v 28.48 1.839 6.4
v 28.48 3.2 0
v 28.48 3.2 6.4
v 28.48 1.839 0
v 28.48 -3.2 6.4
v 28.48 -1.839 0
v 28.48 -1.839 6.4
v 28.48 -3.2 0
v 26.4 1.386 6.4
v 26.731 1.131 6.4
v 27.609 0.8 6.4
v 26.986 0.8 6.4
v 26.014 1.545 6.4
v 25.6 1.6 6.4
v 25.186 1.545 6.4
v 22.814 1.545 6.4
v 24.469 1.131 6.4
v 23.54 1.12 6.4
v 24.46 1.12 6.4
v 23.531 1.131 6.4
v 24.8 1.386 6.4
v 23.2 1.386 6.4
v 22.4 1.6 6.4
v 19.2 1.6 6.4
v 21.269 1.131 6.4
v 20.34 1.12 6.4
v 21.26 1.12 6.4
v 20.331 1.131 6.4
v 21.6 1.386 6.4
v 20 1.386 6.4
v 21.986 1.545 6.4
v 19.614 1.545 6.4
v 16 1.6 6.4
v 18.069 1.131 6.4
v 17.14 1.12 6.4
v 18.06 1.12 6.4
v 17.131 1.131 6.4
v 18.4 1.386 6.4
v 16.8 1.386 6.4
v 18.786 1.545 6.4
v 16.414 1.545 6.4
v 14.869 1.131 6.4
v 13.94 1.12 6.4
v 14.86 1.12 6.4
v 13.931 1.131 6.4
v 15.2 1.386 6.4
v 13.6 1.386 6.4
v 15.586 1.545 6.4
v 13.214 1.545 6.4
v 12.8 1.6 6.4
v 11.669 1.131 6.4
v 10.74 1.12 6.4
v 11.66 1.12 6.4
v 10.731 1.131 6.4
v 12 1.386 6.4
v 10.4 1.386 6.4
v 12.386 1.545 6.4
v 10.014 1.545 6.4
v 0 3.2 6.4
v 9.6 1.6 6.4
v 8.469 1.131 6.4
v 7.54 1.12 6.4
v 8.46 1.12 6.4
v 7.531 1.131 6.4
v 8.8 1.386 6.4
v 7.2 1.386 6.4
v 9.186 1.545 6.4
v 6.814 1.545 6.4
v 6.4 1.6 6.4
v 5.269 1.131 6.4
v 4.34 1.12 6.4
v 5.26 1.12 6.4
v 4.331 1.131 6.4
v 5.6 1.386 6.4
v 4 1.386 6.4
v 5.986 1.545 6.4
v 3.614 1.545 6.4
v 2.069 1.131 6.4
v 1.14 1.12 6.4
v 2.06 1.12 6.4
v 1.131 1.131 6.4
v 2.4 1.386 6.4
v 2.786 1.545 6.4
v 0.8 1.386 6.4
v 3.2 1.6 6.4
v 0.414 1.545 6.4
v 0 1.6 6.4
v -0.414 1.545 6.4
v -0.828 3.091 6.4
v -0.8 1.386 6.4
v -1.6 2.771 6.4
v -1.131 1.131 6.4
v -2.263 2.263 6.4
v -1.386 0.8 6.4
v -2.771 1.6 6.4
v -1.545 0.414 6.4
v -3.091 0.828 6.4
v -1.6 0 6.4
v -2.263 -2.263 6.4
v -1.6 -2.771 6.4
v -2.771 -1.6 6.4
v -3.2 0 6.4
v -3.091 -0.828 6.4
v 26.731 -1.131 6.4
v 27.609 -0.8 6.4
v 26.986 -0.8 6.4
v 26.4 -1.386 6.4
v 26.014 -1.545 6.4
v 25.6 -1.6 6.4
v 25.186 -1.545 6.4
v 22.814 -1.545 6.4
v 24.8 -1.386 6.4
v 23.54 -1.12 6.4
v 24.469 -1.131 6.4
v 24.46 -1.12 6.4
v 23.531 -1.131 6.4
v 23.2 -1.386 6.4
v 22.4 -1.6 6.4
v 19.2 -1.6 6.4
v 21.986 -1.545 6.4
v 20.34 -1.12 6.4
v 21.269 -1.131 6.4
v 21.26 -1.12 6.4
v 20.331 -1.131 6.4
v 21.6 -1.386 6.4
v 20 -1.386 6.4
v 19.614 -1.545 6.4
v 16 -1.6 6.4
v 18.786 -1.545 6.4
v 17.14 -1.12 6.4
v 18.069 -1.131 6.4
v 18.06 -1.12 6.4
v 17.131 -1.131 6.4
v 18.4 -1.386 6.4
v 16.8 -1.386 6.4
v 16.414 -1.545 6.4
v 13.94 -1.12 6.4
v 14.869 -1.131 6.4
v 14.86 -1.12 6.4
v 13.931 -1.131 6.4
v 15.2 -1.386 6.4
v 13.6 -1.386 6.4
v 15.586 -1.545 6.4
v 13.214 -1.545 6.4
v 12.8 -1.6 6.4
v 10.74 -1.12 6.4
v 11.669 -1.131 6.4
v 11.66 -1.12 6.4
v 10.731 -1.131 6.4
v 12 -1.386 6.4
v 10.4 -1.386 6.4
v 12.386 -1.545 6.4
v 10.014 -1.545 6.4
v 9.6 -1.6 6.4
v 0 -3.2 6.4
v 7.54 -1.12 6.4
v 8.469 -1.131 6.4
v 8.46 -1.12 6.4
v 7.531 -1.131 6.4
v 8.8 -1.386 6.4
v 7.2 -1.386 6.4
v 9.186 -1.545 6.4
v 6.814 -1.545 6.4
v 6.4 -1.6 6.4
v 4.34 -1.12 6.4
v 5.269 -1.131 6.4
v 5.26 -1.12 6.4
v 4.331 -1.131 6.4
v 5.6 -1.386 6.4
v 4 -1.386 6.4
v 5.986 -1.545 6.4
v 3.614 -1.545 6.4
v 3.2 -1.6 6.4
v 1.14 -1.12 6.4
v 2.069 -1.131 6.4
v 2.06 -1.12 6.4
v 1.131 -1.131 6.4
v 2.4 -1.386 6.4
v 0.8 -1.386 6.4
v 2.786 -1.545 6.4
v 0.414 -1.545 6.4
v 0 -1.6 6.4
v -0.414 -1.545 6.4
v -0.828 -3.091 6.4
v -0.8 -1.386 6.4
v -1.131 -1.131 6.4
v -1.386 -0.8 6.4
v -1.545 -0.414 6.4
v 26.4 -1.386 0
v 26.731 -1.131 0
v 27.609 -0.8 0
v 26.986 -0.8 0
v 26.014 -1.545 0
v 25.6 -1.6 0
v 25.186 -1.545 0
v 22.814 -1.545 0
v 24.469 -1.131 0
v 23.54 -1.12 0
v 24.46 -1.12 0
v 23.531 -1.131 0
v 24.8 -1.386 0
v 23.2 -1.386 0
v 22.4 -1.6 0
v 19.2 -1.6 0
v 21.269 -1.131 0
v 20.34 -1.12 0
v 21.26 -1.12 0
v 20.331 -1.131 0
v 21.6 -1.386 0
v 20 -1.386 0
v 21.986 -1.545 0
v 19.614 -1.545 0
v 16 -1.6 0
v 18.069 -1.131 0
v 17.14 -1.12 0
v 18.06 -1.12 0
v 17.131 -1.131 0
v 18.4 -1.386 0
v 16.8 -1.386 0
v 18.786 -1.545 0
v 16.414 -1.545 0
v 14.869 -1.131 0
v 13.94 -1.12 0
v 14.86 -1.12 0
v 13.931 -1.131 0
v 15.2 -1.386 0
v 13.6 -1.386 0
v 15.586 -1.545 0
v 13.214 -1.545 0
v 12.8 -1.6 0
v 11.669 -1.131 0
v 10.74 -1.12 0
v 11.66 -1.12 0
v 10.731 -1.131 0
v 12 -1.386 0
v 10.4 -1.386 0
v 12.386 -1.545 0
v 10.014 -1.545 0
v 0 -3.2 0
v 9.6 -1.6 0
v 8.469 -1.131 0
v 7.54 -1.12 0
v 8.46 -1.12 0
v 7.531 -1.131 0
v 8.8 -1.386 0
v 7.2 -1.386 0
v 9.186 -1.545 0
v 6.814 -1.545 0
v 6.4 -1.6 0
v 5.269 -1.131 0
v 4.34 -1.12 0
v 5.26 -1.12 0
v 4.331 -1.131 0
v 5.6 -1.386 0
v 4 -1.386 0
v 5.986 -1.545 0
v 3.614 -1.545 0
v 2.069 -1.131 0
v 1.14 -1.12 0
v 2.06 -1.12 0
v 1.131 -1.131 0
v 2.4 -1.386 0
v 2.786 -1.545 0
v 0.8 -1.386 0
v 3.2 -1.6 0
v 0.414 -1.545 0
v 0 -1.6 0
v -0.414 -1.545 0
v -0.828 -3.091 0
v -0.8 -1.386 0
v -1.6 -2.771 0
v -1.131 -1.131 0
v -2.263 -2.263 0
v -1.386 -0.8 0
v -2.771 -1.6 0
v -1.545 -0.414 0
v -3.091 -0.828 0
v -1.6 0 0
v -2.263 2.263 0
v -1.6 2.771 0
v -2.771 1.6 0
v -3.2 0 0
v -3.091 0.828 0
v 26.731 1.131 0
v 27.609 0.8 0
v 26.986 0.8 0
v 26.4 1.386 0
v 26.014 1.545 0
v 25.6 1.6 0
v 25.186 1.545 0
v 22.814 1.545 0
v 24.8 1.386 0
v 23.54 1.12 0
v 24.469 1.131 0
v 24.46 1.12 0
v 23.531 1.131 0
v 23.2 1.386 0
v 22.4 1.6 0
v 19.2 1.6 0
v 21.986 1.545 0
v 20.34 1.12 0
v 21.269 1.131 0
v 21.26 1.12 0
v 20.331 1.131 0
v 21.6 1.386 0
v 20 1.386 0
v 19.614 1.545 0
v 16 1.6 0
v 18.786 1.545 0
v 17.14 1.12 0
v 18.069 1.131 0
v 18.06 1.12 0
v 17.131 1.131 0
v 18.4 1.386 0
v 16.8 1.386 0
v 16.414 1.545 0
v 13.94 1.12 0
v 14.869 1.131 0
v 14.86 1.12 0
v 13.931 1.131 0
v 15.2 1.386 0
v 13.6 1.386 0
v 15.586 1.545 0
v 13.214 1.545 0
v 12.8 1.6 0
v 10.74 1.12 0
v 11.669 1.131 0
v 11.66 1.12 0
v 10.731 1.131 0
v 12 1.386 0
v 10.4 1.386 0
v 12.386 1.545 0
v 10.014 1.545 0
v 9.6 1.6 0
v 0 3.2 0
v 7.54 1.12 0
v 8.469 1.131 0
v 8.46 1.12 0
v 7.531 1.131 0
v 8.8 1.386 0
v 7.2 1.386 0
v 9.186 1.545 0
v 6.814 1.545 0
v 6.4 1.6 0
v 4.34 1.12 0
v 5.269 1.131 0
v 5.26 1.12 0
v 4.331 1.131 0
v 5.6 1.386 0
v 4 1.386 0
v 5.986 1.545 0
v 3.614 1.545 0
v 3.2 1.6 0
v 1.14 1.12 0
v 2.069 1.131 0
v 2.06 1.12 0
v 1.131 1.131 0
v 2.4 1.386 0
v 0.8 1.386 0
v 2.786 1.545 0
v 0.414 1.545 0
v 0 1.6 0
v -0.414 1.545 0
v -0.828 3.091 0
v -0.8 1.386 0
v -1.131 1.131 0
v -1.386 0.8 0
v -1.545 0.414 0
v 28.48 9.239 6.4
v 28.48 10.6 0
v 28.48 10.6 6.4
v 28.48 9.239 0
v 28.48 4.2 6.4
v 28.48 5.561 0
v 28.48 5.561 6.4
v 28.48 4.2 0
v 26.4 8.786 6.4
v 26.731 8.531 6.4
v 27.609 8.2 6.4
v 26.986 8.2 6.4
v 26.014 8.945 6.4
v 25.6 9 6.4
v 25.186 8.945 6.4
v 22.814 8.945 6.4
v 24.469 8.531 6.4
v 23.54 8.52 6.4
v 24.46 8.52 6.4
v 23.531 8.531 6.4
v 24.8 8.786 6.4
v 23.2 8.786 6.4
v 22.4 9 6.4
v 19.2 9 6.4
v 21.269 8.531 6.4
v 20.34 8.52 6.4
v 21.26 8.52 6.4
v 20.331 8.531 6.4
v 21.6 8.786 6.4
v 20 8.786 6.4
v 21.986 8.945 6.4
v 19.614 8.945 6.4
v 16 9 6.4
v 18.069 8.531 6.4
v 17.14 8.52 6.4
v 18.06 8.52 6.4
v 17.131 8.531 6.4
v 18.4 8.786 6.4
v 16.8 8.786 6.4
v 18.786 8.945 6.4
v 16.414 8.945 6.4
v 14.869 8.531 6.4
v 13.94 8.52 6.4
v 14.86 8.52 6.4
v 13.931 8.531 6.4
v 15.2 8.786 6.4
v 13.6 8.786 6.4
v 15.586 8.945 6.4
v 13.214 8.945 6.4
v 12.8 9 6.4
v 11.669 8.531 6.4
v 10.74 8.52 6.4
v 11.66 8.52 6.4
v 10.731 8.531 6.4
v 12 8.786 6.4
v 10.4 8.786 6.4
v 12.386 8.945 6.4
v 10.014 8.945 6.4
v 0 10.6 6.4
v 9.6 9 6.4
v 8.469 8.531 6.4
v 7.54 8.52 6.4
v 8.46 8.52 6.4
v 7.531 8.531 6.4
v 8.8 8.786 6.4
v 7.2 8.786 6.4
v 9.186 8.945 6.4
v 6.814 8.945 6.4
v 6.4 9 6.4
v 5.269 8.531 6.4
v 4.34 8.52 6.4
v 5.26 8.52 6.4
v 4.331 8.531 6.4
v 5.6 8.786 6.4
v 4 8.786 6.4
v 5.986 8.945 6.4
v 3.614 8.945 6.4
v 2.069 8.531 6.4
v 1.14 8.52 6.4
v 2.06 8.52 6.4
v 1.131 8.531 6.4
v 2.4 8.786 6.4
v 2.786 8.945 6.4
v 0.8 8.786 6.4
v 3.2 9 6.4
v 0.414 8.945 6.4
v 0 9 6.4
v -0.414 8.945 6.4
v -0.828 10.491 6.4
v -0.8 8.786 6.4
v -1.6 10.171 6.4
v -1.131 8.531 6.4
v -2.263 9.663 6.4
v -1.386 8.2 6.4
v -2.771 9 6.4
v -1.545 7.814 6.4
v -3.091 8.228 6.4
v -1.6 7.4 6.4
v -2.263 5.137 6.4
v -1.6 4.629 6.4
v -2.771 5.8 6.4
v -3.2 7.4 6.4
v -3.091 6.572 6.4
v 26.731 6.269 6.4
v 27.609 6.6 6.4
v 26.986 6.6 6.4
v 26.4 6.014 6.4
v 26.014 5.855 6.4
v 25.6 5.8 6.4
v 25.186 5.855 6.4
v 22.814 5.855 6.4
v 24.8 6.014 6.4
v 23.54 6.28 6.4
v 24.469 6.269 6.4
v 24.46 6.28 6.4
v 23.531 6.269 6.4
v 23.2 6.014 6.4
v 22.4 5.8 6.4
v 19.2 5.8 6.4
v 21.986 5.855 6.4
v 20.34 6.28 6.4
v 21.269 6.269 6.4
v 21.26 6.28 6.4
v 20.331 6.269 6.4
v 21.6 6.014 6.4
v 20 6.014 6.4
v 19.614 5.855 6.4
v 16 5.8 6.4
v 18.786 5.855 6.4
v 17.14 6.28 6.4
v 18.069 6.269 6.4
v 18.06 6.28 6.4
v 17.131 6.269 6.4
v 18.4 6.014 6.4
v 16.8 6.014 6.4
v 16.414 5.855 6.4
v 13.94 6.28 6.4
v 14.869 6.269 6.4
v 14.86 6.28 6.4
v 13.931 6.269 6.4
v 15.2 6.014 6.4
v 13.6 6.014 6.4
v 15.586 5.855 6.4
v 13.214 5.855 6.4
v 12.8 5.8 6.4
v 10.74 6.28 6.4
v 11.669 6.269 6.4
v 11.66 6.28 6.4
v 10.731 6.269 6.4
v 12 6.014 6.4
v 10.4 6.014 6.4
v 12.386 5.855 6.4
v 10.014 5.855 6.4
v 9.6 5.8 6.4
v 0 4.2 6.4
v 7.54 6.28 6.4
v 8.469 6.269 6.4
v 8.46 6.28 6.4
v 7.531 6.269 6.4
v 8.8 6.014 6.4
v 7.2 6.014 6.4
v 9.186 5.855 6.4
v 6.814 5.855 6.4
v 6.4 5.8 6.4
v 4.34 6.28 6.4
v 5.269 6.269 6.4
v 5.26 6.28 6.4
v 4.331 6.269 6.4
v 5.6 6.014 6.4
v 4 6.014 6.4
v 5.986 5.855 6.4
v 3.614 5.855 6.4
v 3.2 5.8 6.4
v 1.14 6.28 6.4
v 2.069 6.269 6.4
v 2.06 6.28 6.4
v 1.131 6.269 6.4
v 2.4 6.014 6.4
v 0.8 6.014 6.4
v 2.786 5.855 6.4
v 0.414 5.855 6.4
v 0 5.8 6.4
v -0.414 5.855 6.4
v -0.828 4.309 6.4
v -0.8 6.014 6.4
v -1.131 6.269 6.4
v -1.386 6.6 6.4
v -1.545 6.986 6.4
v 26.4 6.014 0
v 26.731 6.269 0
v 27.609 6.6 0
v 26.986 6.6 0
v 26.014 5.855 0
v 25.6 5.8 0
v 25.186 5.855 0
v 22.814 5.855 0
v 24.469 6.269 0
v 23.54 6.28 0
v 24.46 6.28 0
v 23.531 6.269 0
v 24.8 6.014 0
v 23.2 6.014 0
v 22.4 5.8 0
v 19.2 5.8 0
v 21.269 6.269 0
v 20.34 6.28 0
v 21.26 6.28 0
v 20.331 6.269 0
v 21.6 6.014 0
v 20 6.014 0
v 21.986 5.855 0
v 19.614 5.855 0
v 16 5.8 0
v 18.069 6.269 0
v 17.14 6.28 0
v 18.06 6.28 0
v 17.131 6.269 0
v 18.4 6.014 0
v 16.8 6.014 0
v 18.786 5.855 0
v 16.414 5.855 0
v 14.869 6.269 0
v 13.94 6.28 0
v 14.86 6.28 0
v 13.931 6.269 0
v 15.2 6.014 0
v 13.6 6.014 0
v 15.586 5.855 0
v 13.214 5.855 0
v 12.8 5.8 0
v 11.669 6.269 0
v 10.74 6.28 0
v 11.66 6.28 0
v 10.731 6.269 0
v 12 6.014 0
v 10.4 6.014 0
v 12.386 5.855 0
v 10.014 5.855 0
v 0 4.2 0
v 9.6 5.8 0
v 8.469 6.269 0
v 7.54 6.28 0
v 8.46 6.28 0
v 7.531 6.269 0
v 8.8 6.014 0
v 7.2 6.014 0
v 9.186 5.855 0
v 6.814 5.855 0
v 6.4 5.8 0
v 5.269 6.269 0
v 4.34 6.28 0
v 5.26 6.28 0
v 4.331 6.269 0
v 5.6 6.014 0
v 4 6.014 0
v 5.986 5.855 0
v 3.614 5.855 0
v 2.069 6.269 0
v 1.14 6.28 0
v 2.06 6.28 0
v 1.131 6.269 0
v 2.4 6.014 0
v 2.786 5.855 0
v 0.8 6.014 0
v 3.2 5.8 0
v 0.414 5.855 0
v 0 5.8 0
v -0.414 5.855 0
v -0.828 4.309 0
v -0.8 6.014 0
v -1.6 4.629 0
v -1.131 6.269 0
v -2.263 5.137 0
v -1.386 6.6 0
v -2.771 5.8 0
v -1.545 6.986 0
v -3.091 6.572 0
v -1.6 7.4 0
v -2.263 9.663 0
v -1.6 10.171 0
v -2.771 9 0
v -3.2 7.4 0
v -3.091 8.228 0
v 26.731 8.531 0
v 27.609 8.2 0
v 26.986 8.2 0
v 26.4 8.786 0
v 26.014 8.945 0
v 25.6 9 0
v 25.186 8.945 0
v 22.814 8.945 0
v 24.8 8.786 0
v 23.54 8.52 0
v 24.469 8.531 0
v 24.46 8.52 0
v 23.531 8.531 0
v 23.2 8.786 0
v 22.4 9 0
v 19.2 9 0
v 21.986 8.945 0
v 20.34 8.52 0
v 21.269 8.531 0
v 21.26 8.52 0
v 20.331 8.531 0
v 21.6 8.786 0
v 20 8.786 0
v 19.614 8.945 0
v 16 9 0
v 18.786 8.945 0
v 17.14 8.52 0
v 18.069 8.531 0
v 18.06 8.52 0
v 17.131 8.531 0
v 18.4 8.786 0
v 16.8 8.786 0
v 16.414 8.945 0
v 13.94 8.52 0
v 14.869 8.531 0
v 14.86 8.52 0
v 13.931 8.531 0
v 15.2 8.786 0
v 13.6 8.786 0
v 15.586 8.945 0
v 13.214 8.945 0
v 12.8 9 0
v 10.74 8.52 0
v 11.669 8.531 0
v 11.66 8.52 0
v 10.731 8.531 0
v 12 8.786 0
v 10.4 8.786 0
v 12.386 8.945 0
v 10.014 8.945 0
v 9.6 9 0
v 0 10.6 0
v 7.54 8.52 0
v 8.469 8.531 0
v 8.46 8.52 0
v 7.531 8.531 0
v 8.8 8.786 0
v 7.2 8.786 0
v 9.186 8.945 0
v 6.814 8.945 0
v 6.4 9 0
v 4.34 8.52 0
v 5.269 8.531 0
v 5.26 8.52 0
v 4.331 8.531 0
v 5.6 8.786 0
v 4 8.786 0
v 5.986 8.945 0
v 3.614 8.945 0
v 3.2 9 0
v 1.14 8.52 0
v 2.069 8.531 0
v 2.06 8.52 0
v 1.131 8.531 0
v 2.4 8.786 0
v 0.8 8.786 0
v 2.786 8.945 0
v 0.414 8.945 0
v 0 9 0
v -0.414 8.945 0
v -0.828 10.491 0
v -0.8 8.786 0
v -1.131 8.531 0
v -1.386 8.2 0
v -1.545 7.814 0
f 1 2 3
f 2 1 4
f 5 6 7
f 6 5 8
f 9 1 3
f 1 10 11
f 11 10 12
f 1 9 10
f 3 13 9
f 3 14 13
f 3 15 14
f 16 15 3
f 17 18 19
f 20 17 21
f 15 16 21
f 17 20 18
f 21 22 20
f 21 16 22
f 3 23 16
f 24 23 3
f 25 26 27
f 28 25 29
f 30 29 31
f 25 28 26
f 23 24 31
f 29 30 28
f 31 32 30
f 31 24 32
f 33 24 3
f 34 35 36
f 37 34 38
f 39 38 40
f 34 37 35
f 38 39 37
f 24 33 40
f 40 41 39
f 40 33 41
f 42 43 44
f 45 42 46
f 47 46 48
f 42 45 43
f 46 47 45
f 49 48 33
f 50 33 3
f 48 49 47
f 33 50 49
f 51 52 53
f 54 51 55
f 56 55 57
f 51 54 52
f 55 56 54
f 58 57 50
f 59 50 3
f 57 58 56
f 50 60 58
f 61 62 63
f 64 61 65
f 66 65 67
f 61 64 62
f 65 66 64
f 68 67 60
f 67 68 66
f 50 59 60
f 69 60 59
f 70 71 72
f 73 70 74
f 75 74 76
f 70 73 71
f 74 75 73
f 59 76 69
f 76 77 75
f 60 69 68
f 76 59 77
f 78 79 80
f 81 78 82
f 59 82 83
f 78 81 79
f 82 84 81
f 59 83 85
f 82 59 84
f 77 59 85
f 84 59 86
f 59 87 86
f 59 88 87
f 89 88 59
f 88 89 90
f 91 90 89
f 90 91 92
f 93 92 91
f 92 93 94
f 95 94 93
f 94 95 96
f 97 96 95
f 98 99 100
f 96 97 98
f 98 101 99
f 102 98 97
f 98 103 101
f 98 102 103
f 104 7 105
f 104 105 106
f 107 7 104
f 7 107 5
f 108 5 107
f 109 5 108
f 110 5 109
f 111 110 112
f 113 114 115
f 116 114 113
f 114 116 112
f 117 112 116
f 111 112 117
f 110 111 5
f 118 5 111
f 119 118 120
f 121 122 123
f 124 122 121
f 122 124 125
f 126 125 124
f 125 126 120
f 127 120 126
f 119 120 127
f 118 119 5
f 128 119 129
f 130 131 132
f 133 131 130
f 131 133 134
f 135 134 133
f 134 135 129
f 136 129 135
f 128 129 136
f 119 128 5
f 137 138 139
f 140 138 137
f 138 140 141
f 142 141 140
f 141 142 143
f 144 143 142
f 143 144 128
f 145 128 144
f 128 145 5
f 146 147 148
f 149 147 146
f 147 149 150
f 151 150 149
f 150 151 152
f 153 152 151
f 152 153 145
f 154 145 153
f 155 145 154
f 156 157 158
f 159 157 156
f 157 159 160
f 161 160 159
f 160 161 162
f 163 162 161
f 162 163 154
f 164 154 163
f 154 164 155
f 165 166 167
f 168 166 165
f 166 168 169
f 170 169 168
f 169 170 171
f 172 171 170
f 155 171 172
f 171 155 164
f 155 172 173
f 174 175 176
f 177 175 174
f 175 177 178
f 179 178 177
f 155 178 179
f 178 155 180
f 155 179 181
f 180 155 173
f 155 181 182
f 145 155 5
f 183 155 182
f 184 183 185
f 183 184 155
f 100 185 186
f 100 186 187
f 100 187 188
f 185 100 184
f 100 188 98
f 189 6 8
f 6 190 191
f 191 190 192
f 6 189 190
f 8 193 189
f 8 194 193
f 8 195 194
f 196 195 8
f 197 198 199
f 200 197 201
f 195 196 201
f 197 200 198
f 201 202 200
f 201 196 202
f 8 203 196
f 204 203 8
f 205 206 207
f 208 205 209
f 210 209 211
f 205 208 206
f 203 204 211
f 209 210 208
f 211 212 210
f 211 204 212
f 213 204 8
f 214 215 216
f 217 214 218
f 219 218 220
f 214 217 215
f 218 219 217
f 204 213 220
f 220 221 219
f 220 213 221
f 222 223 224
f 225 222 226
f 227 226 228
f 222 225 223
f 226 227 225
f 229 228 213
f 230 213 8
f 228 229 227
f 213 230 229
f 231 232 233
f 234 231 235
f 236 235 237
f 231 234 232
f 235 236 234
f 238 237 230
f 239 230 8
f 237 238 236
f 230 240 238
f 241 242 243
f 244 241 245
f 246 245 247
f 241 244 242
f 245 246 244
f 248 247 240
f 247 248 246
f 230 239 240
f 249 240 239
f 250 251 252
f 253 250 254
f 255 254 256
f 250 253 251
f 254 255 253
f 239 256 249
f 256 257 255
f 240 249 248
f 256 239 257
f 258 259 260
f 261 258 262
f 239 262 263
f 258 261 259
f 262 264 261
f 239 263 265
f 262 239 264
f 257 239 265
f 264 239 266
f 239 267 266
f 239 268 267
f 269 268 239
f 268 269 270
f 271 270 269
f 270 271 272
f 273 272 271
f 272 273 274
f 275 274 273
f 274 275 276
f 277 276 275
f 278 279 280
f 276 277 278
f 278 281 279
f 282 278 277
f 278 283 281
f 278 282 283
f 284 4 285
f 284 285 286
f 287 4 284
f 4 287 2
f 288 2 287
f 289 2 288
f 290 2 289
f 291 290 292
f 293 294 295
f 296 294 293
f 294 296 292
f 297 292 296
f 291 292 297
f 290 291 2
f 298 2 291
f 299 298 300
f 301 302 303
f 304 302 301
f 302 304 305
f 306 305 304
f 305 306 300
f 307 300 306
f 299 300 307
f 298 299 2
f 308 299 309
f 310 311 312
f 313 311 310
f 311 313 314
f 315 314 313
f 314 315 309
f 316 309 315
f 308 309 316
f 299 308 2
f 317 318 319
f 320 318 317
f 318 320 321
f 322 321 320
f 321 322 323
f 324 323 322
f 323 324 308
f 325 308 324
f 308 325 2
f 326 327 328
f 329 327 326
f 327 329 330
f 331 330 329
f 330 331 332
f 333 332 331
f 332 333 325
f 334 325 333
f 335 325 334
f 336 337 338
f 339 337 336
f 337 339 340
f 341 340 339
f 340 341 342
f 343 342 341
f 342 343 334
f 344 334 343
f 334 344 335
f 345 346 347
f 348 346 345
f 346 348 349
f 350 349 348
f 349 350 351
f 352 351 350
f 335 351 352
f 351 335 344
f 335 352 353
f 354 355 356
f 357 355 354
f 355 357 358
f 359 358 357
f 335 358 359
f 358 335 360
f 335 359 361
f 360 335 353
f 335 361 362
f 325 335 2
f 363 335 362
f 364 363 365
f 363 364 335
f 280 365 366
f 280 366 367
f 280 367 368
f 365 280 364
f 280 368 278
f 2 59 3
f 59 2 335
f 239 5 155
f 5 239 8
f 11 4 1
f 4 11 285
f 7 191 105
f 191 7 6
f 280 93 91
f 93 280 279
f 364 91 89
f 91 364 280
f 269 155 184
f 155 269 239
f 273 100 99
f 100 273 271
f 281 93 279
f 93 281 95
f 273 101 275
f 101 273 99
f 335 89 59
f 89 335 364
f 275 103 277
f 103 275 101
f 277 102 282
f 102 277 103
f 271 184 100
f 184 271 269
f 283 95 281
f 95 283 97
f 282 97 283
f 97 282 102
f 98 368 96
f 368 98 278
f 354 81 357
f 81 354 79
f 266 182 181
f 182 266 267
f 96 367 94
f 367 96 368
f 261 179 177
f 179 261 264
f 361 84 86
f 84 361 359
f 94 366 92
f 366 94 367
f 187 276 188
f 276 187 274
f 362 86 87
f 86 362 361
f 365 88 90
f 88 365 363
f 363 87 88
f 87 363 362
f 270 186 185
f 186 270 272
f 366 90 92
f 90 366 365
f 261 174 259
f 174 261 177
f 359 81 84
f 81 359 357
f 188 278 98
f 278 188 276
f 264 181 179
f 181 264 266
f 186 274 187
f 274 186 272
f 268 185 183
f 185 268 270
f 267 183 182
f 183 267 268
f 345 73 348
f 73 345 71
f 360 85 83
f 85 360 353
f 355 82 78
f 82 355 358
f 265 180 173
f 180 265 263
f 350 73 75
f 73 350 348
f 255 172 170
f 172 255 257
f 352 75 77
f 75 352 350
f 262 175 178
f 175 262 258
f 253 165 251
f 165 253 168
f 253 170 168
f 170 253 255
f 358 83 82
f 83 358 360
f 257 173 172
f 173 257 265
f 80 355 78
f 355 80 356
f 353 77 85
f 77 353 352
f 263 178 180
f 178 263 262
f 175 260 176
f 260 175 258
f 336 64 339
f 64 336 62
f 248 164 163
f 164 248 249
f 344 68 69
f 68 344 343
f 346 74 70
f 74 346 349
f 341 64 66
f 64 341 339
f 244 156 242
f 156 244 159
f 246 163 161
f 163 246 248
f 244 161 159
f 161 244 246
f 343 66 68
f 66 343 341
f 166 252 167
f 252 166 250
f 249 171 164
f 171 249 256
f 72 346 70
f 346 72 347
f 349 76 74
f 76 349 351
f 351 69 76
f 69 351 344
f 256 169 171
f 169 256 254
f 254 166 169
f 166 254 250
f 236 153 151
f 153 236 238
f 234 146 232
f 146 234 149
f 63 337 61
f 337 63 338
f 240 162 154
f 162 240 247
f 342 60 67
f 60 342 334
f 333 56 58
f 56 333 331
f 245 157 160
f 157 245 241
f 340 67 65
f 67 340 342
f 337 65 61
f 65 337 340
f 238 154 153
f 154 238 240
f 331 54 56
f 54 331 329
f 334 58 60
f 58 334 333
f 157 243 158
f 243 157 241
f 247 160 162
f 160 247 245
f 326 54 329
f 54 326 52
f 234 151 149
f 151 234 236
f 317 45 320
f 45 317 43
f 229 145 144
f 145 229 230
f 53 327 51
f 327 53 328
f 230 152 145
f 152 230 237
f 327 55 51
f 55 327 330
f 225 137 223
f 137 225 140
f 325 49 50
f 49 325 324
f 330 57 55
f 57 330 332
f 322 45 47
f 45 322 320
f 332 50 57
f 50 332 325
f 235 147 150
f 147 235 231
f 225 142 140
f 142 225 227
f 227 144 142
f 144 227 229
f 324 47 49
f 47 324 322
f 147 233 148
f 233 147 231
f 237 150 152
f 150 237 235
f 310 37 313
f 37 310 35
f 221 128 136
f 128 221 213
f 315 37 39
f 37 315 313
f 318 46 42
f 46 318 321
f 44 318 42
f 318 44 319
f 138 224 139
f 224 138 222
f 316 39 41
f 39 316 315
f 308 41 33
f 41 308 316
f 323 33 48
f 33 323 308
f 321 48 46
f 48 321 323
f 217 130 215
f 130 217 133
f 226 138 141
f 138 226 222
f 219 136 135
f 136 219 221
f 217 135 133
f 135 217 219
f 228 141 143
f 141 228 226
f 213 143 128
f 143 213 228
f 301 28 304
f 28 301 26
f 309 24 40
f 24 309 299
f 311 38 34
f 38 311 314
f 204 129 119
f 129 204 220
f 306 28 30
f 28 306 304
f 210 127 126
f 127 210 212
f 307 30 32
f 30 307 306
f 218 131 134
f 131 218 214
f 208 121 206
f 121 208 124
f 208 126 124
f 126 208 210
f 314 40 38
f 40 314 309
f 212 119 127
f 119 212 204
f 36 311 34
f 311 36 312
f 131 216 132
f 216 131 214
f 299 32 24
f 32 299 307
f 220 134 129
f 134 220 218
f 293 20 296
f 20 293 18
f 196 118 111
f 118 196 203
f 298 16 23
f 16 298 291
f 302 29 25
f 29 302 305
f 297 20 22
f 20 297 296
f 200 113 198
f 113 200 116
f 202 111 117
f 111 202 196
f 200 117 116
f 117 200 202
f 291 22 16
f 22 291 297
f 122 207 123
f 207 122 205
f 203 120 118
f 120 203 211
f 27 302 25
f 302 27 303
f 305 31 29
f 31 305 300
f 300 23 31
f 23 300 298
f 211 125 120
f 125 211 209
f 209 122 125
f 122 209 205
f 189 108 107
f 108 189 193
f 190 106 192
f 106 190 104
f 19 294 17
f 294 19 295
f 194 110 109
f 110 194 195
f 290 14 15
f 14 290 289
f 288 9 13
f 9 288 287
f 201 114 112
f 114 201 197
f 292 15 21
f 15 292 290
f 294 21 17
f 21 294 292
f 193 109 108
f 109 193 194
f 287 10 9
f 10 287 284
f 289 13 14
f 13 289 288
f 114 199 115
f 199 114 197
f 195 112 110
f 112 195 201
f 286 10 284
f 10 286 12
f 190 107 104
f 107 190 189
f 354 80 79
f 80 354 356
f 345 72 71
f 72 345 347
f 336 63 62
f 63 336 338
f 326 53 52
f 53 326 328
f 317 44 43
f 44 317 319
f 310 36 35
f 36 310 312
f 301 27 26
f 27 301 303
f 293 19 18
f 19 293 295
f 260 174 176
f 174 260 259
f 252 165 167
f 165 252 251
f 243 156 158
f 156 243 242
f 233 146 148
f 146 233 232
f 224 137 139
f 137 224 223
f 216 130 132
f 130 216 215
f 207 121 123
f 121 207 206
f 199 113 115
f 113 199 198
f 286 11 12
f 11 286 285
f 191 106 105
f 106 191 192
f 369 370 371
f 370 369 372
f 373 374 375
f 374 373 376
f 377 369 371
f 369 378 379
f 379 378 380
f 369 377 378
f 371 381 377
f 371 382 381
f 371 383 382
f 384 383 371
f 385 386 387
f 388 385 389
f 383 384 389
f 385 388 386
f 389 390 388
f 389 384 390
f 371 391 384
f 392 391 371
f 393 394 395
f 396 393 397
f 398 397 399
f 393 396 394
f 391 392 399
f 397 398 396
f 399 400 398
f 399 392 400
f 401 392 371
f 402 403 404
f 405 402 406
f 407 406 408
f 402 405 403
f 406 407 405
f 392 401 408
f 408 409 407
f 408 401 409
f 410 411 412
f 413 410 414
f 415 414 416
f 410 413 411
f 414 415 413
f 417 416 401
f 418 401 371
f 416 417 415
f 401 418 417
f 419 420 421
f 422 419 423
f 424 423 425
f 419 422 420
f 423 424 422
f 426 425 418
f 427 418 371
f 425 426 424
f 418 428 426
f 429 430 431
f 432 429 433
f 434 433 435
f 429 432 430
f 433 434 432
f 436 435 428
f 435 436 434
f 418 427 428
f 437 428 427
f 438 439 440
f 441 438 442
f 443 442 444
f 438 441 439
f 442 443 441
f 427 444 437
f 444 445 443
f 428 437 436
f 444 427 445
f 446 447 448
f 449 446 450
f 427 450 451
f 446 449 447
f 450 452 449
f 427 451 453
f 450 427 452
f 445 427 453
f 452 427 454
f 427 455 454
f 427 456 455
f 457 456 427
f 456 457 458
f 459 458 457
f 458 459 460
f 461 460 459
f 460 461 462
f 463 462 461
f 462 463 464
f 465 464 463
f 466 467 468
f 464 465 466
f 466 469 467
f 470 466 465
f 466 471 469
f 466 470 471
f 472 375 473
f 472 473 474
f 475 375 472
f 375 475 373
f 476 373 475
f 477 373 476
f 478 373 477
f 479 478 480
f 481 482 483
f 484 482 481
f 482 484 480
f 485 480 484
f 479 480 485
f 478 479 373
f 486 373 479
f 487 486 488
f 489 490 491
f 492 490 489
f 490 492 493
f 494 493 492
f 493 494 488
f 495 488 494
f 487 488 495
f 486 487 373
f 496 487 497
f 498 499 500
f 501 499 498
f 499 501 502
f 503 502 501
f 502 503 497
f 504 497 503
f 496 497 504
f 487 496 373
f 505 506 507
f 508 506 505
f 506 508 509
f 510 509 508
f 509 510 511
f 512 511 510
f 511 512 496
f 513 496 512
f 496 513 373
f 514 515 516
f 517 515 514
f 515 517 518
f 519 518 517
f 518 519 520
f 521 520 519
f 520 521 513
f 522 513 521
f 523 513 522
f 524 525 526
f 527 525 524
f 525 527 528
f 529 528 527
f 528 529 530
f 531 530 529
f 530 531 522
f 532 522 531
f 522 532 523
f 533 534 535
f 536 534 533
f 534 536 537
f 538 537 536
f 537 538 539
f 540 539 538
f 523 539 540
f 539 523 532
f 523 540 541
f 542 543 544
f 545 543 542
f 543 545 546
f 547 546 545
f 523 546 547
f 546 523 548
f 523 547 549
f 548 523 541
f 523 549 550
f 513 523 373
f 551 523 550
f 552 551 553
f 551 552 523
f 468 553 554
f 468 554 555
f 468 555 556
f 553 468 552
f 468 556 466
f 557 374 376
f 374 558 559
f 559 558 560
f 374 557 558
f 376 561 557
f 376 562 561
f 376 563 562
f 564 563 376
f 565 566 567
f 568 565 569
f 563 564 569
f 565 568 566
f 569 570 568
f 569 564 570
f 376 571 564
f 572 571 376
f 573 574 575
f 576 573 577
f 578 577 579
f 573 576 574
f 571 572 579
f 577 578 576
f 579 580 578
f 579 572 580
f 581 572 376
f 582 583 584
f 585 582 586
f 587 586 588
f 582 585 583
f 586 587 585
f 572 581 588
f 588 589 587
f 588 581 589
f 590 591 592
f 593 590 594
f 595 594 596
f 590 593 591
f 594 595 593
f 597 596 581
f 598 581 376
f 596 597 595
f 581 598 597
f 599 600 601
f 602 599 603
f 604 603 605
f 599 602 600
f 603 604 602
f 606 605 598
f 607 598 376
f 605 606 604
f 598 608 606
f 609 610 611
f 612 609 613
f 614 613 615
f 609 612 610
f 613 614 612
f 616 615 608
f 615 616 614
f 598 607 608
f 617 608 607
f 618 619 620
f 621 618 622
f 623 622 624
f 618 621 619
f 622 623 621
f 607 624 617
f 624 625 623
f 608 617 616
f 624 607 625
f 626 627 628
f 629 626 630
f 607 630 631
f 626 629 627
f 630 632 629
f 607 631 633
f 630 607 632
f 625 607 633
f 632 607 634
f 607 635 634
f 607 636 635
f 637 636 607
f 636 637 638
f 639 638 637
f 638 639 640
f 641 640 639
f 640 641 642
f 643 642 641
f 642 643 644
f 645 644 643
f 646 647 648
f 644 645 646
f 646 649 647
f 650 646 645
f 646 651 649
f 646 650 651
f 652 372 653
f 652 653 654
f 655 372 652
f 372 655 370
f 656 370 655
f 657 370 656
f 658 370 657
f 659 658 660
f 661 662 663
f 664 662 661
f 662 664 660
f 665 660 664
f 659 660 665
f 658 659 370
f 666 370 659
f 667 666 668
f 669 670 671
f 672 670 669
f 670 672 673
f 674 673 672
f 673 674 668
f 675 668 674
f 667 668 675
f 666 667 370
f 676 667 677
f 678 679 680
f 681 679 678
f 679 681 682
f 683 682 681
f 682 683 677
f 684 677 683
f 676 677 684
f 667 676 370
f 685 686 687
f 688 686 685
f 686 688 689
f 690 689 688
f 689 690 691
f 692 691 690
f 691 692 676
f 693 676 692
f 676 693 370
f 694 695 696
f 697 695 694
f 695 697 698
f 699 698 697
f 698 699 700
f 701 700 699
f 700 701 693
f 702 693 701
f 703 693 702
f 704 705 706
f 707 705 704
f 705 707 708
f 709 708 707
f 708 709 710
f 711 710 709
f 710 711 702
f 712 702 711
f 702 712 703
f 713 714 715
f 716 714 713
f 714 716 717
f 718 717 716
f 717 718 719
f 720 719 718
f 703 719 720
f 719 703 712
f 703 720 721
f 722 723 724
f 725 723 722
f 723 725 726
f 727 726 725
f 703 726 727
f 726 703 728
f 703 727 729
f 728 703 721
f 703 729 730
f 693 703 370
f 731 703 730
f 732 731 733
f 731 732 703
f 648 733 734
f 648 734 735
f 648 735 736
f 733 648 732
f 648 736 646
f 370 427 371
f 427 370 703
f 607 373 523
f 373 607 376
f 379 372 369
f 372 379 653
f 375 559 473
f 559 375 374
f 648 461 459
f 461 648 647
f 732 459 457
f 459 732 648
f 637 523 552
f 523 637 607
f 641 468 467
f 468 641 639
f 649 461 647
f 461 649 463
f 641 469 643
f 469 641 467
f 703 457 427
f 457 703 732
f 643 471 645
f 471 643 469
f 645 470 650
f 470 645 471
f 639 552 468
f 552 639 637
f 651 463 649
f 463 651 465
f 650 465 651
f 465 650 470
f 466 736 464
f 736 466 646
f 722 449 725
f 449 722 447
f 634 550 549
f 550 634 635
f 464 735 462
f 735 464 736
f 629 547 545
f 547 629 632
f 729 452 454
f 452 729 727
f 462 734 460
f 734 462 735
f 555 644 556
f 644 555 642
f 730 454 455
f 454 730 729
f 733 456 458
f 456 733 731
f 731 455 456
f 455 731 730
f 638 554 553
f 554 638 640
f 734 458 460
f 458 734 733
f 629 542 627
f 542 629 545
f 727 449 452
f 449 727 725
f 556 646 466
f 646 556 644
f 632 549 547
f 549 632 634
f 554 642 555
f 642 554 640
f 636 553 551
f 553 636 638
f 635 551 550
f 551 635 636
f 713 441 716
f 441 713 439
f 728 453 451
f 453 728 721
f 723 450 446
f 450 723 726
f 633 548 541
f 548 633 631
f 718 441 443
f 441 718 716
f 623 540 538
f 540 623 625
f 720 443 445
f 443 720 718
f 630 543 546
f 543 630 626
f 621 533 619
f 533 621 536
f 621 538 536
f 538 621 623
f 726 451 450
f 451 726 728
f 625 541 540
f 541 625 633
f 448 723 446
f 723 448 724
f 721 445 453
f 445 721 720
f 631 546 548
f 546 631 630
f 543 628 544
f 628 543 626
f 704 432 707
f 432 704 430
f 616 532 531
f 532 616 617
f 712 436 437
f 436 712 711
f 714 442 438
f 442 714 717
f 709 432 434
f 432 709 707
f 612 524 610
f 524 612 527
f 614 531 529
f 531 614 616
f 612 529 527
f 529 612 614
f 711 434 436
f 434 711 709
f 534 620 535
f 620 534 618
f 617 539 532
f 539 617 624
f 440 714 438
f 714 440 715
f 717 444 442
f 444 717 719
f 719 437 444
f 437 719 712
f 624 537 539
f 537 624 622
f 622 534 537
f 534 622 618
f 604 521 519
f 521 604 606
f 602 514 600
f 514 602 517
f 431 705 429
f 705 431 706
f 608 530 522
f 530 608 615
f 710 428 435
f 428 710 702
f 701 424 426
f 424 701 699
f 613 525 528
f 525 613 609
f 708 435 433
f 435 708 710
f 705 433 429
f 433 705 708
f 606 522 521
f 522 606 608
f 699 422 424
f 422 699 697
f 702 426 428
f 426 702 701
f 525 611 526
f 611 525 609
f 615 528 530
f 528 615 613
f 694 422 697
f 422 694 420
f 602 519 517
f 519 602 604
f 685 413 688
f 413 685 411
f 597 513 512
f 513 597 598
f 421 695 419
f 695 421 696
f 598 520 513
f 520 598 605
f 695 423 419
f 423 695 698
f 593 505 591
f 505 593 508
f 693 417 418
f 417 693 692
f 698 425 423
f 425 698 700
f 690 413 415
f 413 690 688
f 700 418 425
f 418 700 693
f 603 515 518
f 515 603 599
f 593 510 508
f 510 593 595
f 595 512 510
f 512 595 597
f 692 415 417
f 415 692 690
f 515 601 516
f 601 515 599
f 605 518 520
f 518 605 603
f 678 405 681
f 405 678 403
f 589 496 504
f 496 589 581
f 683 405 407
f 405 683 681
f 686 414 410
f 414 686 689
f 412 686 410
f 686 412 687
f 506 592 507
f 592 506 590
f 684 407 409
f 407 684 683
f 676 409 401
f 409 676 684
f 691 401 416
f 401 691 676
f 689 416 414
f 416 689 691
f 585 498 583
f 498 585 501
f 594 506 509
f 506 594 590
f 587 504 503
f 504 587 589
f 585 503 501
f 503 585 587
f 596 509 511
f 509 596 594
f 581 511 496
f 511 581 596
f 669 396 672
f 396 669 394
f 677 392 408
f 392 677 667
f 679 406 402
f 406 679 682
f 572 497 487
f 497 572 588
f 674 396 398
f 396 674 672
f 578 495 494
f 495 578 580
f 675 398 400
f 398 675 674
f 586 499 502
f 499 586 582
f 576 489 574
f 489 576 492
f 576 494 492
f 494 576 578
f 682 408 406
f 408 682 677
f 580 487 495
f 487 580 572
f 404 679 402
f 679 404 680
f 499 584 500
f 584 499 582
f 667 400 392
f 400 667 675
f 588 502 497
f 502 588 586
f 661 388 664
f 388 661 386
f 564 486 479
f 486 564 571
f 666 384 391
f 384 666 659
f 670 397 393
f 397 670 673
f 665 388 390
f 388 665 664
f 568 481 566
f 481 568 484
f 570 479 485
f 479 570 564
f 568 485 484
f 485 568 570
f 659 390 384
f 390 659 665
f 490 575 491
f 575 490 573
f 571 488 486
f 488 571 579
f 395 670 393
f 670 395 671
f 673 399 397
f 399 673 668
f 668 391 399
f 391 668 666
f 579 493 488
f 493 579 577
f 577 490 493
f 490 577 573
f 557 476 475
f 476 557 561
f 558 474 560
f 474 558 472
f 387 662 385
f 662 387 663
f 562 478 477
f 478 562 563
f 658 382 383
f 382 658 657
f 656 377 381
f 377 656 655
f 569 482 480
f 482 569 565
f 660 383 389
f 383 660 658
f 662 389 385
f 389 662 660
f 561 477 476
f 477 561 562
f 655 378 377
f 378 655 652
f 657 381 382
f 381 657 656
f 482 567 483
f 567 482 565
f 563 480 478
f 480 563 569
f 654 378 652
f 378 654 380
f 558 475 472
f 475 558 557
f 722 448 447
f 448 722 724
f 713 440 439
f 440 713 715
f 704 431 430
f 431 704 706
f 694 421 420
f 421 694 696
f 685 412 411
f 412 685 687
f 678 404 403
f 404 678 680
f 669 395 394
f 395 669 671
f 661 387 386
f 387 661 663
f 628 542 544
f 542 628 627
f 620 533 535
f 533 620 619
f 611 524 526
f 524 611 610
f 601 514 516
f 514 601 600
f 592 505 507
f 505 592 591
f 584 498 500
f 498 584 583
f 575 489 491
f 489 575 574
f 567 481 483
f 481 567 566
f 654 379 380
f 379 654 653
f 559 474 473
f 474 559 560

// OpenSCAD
d=3.2;  // cable diameter
n=9;    // cable loop count

//l=22.6;
//h=7.9;
//b=7.1;
//d1=1.7;
//d2=2.83;

nx=1;   // how many you want
ny=2;   // 2 * 4 = 8 pcs

d1=d/2;
d2=(3/4)*d;
b=2*d;
l=(n+0.9)*d;
h=b;

e=0.001;

module outer(l,h,b,d1,d2){
    cylinder(r=b/2,h=h,$fn=24);
    difference(){
        translate([0,-b/2,0])cube([l-b/2,b,h]);
        translate([l-b/2-d2*sin(40),0,-e])rotate([0,0,-40])cube([b,b,h+2*e]);
        translate([l-b/2-d2*sin(40),0,-e])rotate([0,0,-50])cube([b,b,h+2*e]);
    }
}

module inner(l,h,b,d1,d2){
    translate([0,0,-e]){
        for (i=[0:n-1]){
            translate([i*d,0,0])cylinder(r=b/2-d1,h=h+2*e,$fn=24);
        }
//      translate([l-b,0,0])cylinder(r=b/2-d1,h=h+2*e,$fn=24);
        translate([0,-(b-2.6*d1)/2,0])cube([l-b,b-2.6*d1,h+2*e]);
        translate([0,-(b-2*d2)/2,0])cube([l,b-2*d2,h+2*e]);
    }
}

module clip(l,h,b,d1,d2){
    difference(){
        outer(l,h,b,d1,d2);
        inner(l,h,b,d1,d2);
    }
}

for(xi=[0:nx-1])
    for(yi=[0:ny-1])
        translate([xi*(l+1),yi*(b+1),0])clip(l,h,b,d1,d2);
